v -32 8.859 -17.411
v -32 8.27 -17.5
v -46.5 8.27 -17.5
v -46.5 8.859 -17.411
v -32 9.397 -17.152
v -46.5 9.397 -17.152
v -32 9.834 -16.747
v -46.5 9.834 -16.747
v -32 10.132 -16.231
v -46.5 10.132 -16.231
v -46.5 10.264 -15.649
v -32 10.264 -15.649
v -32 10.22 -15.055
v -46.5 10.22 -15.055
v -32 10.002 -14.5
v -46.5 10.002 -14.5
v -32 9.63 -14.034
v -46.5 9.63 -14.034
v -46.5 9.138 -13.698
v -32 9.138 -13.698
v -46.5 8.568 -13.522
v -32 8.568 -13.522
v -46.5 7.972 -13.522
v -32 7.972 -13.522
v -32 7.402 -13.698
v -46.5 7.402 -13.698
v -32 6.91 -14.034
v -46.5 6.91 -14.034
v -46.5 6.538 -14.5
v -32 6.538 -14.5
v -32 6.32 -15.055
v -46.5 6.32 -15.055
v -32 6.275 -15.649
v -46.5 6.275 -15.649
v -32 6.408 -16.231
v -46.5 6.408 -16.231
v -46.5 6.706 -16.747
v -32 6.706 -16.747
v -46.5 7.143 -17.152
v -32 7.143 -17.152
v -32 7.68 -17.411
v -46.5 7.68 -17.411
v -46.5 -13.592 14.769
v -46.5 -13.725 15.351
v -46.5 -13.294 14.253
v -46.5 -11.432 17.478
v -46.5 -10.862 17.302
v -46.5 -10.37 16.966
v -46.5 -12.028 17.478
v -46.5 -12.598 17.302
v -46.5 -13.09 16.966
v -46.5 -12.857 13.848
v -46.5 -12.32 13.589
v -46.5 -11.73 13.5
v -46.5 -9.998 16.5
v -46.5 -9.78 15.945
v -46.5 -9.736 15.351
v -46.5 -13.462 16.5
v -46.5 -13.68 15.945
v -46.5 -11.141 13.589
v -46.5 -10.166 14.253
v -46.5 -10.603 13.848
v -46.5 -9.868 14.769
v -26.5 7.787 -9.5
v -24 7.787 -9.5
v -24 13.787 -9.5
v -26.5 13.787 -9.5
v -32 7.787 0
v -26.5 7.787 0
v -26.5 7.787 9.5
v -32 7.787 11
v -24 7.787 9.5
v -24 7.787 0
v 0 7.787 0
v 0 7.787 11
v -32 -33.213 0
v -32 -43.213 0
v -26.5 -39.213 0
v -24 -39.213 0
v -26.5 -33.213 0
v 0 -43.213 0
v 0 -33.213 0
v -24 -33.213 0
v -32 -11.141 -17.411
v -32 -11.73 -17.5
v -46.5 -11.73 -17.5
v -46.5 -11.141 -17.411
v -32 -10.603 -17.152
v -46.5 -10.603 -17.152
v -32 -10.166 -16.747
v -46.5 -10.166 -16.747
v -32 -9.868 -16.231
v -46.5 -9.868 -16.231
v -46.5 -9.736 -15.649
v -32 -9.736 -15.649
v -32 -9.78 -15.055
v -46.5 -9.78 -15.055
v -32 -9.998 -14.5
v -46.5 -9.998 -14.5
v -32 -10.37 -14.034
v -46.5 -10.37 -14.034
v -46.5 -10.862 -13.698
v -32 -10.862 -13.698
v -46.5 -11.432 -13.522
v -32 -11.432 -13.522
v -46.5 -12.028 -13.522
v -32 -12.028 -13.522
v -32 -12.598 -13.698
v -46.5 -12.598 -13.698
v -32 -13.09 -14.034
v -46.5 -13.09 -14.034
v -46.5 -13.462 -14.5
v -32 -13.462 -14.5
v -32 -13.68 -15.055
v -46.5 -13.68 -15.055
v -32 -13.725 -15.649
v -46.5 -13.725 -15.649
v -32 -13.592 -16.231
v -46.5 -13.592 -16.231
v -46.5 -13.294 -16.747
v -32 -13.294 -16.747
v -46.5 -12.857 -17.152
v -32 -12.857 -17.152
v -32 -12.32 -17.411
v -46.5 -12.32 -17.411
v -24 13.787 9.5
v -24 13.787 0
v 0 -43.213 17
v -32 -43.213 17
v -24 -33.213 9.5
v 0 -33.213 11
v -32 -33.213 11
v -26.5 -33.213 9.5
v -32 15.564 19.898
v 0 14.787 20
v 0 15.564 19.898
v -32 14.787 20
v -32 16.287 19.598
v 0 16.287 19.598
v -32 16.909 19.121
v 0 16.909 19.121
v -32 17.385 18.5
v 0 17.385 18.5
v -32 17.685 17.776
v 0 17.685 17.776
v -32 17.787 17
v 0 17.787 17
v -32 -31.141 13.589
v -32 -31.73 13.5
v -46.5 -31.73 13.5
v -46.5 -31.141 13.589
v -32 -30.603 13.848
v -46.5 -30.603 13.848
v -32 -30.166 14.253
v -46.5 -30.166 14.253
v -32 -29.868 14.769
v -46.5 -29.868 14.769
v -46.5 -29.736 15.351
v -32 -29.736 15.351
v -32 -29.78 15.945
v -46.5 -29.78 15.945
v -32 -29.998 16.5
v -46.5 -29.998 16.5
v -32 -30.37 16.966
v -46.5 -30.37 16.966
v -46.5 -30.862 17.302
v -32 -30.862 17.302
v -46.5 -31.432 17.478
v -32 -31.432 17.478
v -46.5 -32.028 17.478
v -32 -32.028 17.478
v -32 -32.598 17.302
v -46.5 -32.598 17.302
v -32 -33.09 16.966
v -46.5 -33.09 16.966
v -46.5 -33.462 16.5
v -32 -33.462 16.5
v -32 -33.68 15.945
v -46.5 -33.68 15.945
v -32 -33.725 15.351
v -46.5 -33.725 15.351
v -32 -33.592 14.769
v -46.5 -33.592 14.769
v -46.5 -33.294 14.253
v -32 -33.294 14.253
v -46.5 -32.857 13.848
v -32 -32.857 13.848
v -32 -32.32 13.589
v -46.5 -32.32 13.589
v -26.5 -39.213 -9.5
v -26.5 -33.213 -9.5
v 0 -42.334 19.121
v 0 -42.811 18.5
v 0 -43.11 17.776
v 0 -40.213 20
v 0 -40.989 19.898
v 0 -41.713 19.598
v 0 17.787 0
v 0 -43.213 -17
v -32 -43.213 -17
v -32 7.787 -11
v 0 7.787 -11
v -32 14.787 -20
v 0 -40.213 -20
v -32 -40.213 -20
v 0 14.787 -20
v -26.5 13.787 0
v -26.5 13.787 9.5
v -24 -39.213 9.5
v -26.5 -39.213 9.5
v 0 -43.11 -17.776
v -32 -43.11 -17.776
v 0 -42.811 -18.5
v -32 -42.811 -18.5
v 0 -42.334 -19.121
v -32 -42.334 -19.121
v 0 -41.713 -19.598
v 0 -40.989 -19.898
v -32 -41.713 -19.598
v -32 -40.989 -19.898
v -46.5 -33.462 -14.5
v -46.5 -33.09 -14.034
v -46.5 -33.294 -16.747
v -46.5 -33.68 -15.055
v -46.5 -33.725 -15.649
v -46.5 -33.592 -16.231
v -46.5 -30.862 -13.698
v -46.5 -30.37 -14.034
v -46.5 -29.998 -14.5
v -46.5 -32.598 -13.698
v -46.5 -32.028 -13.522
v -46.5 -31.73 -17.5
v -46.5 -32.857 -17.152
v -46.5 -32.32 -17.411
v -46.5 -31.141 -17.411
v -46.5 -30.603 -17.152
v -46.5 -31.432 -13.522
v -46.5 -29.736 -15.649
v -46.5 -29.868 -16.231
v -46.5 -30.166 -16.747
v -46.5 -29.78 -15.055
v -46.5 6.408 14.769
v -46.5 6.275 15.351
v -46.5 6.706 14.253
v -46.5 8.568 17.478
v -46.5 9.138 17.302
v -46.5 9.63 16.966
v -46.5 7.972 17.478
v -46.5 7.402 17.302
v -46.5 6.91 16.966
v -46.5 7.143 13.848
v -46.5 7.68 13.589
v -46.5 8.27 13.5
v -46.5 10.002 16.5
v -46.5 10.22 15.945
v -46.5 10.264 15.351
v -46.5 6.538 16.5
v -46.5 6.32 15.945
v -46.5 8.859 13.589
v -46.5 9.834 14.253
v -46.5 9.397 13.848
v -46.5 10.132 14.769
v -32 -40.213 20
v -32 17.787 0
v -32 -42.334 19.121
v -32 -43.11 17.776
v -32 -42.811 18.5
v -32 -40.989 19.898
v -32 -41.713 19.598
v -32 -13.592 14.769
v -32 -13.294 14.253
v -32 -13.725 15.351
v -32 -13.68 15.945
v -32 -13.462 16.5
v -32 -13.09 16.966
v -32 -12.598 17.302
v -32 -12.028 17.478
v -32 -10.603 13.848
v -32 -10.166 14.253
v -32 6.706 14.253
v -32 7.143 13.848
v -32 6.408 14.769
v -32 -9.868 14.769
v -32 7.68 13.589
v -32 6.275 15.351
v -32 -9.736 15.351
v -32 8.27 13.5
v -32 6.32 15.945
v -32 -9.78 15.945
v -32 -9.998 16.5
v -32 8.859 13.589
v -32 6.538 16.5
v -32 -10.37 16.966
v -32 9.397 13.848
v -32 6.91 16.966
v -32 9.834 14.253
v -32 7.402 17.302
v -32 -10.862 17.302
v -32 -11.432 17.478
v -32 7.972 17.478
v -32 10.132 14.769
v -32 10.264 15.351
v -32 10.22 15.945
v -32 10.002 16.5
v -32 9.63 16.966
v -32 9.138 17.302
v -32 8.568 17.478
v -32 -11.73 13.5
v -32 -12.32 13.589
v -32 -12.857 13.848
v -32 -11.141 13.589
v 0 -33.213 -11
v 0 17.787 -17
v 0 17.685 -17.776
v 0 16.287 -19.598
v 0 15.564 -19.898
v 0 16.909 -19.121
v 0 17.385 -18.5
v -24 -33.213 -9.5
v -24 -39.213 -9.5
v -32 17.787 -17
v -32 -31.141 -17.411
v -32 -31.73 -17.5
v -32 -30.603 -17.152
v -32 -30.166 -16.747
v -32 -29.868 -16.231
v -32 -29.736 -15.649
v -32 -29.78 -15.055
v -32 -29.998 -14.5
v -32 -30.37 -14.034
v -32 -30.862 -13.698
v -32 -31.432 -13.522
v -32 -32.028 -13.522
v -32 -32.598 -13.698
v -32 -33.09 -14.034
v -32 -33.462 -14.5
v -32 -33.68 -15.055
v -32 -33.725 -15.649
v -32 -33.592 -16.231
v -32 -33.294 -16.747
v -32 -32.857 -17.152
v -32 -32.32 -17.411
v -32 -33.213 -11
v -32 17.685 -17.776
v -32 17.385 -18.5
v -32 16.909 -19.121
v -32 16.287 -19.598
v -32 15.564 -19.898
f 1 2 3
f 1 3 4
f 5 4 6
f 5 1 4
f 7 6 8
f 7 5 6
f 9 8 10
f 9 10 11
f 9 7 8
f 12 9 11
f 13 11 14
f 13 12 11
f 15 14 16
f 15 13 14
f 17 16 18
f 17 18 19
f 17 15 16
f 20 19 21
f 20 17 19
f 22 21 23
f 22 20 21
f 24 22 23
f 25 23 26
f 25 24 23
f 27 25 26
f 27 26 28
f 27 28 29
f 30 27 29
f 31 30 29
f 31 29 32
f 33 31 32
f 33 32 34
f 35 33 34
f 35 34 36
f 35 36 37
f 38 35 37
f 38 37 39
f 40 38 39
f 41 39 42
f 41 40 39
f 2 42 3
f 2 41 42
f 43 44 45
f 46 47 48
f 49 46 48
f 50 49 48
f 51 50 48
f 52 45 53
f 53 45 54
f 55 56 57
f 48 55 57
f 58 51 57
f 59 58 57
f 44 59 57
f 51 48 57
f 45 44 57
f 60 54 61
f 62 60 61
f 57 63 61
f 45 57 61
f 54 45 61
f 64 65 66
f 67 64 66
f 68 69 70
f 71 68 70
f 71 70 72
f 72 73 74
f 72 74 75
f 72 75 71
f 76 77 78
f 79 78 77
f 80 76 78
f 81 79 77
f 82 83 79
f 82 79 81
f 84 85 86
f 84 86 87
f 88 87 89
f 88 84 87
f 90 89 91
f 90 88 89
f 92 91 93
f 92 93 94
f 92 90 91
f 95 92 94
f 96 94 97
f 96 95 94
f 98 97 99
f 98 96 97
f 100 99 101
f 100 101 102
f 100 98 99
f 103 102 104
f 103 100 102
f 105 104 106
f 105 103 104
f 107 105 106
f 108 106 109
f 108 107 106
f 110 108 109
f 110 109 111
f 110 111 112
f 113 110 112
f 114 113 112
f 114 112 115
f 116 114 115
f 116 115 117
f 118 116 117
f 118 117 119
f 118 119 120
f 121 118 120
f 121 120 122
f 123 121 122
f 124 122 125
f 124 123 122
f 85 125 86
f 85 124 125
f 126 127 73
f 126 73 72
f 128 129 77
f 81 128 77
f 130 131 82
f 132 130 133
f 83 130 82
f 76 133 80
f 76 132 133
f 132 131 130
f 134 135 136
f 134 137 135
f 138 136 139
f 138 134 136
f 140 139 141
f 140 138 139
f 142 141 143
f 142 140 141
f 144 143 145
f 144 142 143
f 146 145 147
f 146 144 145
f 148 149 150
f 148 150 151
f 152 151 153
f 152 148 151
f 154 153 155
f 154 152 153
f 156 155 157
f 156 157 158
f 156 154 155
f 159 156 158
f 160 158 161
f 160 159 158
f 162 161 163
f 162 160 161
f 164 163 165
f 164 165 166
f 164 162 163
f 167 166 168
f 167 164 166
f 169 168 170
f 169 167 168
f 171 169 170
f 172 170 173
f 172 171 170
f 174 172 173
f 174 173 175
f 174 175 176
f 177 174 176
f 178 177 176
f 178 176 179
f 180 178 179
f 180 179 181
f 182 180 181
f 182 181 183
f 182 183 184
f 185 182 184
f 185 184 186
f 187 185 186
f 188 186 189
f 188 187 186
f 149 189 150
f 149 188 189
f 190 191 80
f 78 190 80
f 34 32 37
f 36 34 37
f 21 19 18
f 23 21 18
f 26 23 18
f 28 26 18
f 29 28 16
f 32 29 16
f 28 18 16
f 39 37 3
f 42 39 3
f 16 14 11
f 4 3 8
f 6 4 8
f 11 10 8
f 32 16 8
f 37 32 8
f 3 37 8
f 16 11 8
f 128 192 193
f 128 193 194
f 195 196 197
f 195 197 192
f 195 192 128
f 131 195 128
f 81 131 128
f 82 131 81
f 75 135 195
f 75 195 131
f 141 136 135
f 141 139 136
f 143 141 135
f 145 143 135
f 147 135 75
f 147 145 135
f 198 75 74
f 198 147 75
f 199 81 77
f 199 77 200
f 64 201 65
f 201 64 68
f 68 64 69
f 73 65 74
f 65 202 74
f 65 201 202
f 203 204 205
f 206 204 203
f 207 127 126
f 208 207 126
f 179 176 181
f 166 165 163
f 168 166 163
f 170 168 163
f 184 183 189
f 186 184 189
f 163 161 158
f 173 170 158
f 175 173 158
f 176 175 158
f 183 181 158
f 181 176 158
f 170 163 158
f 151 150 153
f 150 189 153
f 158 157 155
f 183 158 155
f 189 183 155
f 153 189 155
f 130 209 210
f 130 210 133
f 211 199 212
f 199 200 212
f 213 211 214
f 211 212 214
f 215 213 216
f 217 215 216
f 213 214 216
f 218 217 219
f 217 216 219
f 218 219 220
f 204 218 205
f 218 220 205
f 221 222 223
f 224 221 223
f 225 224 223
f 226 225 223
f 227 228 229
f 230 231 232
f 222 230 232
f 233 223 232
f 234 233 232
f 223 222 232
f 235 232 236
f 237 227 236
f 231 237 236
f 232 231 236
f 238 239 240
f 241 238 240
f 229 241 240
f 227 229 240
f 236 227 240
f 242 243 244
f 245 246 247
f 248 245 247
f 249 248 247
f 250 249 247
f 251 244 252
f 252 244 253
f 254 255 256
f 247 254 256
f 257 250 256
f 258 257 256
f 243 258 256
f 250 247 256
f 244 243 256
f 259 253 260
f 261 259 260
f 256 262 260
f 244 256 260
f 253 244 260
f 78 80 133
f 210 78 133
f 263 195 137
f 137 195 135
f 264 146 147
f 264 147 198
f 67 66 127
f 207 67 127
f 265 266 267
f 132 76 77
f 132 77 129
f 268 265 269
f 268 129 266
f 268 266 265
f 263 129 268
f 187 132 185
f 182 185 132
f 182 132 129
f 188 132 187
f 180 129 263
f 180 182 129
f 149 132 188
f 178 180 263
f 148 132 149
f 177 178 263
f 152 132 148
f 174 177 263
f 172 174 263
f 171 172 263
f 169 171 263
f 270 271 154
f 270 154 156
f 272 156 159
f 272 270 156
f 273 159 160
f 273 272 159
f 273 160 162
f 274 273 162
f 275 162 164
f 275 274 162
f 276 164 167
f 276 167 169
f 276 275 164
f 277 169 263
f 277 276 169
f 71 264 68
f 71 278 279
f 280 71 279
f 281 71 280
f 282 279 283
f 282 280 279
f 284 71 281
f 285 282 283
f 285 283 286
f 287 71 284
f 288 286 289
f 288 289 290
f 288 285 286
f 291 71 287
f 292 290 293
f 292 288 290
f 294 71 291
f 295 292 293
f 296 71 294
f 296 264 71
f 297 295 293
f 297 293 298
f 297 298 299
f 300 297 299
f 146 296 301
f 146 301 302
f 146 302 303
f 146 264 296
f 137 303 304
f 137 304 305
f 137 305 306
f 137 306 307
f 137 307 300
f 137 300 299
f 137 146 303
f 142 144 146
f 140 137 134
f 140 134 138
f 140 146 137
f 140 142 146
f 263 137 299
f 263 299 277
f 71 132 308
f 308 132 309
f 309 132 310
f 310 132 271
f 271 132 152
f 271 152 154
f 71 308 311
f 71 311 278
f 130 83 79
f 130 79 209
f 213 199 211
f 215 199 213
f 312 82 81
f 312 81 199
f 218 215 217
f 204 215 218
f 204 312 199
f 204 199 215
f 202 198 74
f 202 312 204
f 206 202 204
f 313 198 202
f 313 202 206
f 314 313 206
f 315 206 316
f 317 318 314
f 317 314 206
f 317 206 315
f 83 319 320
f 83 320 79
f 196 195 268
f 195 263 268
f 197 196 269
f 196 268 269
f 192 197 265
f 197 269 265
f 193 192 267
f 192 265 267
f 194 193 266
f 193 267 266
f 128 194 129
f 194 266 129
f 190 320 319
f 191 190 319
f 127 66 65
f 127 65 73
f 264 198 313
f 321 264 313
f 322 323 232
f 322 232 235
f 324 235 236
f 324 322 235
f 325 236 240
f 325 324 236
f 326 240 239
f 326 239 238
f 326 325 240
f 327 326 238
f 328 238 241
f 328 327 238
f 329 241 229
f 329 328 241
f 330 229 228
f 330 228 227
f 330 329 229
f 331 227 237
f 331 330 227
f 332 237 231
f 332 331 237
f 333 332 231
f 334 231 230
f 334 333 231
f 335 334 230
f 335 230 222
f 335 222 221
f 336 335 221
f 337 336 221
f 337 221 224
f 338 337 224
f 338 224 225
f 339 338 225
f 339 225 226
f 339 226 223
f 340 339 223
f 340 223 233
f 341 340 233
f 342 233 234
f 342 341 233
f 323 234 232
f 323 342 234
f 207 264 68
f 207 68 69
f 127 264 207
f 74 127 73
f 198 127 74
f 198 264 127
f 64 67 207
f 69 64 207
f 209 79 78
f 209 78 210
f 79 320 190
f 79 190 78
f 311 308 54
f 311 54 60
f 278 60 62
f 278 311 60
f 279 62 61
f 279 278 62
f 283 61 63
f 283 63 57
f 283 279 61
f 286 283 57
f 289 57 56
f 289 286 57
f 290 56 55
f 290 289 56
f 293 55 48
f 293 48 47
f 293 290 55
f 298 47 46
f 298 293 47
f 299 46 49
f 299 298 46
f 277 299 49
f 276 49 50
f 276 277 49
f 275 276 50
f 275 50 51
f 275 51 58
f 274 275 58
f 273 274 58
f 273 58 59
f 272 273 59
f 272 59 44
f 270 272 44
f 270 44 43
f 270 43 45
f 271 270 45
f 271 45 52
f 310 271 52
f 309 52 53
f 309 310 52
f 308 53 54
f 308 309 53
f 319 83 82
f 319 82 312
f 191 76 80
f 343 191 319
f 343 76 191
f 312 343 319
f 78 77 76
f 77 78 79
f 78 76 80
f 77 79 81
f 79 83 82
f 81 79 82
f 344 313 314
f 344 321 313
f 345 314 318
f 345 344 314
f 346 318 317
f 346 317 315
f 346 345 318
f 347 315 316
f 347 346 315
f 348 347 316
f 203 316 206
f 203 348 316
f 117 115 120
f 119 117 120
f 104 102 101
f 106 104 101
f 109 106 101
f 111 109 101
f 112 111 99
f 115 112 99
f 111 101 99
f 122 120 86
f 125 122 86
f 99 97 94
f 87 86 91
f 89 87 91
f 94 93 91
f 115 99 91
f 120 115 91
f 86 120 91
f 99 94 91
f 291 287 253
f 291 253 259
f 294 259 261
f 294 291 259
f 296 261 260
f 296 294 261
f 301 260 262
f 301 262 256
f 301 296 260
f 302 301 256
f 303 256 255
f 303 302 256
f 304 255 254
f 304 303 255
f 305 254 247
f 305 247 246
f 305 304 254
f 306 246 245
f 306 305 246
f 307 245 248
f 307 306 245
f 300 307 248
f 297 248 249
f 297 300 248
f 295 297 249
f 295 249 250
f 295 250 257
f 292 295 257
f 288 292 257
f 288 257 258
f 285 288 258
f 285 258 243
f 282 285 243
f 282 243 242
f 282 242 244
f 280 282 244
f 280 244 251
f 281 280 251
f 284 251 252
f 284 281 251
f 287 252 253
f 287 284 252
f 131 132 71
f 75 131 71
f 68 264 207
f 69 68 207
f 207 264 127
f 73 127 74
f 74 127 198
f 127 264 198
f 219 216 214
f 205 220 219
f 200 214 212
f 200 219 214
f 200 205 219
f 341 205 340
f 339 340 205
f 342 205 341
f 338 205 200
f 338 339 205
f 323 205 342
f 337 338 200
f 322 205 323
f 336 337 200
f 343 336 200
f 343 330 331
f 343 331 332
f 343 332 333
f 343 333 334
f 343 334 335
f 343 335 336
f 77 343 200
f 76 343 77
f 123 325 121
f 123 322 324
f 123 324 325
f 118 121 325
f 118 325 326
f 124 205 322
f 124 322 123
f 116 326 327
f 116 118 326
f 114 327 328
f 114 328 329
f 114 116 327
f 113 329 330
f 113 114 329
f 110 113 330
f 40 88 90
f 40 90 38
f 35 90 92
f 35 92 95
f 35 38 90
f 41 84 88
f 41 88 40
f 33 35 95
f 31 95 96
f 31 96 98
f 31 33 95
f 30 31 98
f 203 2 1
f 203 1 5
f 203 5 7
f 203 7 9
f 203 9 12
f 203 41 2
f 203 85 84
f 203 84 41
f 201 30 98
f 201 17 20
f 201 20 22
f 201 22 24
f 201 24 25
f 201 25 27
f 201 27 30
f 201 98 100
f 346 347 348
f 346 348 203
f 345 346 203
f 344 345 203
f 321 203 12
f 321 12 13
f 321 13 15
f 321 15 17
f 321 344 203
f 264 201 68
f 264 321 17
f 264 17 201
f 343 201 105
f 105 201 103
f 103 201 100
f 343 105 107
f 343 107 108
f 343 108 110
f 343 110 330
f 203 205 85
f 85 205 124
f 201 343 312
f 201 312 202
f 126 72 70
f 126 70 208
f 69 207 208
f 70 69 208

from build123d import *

# Parameters (mm, degrees)
CROQUIS2_W                 = 40
CROQUIS2_H                 = 61
SALIENTE_EXTRUIR1_DEPTH    = 32
CORTAR_EXTRUIR1_DEPTH      = 58.370121173
CORTAR_EXTRUIR1_DEPTH_BACK = 58.370121173
CROQUIS4_W                 = 22
CROQUIS4_H                 = 41
CORTAR_EXTRUIR2_DEPTH      = 58.370121173
CORTAR_EXTRUIR2_DEPTH_BACK = 8
CROQUIS5_W                 = 19
CROQUIS5_H                 = 53
SALIENTE_EXTRUIR2_START    = 2.5
CROQUIS7_W                 = 19
CROQUIS7_H                 = 6
SALIENTE_EXTRUIR2_DEPTH    = 5.5
CROQUIS9_R                 = 2
SALIENTE_EXTRUIR3_DEPTH    = 14.5
REDONDEO1_R                = 3


with BuildPart() as part:
    # Croquis2 → Saliente-Extruir1 (new body)
    with BuildSketch(Plane(origin=(0, 0, 0), x_dir=(0, 0, -1), z_dir=(1, 0, 0))):
        with Locations((0, -12.712623195)):
            Rectangle(CROQUIS2_W, CROQUIS2_H)
    extrude(amount=-SALIENTE_EXTRUIR1_DEPTH)

    # Croquis4 → Cortar-Extruir1 (cut, two sides: drawn at the far end of the back side and taken through both)
    with BuildSketch(Plane(origin=(0, 0, 0), x_dir=(0, 0, -1), z_dir=(1, 0, 0)).offset(-CORTAR_EXTRUIR1_DEPTH_BACK)):
        with Locations((0, -12.712623195)):
            Rectangle(CROQUIS4_W, CROQUIS4_H)
    extrude(amount=CORTAR_EXTRUIR1_DEPTH + CORTAR_EXTRUIR1_DEPTH_BACK, mode=Mode.SUBTRACT)

    # Croquis5 → Cortar-Extruir2 (cut, two sides: drawn at the far end of the back side and taken through both)
    with BuildSketch(Plane.ZY.offset(32).offset(-CORTAR_EXTRUIR2_DEPTH_BACK)):
        with Locations((0, -12.712623195)):
            Rectangle(CROQUIS5_W, CROQUIS5_H)
    extrude(amount=CORTAR_EXTRUIR2_DEPTH + CORTAR_EXTRUIR2_DEPTH_BACK, mode=Mode.SUBTRACT)

    # Croquis7 → Saliente-Extruir2 (add)
    with BuildSketch(Plane.ZY.offset(24).offset(SALIENTE_EXTRUIR2_START)):
        with Locations((0, 10.787376805)):
            Rectangle(CROQUIS7_W, CROQUIS7_H)
        with Locations((0, -36.212623195)):
            Rectangle(CROQUIS7_W, CROQUIS7_H)
    extrude(amount=SALIENTE_EXTRUIR2_DEPTH)

    # Croquis9 → Saliente-Extruir3 (add)
    with BuildSketch(Plane(origin=(-32, 0, 0), x_dir=(0, 0, -1), z_dir=(1, 0, 0))):
        with Locations((-15.5, 8.269876805)):
            Circle(CROQUIS9_R)
        with Locations((-15.5, -31.730123195)):
            Circle(CROQUIS9_R)
        with Locations((-15.5, -11.730123195)):
            Circle(CROQUIS9_R)
        with Locations((15.5, -31.730123195)):
            Circle(CROQUIS9_R)
        with Locations((15.5, -11.730123195)):
            Circle(CROQUIS9_R)
        with Locations((15.5, 8.269876805)):
            Circle(CROQUIS9_R)
    extrude(amount=-SALIENTE_EXTRUIR3_DEPTH)

    # Redondeo1
    redondeo1_edges = [part.edges().sort_by_distance(p)[0] for p in [
        (-16, -43.212623195, -20),
        (-16, -43.212623195, 20),
        (-16, 17.787376805, 20),
        (-16, 17.787376805, -20),
    ]]
    fillet(redondeo1_edges, radius=REDONDEO1_R)


with BuildPart() as body_2:
    # Partir1: the piece on the far side of the plane
    add(part.part)
    split(bisect_by=Plane.XY, keep=Keep.BOTTOM)


with BuildPart() as part_1:
    add(part.part)

    # Partir1
    split(bisect_by=Plane.XY, keep=Keep.TOP)


solid = Compound([body_2.part, part_1.part])
